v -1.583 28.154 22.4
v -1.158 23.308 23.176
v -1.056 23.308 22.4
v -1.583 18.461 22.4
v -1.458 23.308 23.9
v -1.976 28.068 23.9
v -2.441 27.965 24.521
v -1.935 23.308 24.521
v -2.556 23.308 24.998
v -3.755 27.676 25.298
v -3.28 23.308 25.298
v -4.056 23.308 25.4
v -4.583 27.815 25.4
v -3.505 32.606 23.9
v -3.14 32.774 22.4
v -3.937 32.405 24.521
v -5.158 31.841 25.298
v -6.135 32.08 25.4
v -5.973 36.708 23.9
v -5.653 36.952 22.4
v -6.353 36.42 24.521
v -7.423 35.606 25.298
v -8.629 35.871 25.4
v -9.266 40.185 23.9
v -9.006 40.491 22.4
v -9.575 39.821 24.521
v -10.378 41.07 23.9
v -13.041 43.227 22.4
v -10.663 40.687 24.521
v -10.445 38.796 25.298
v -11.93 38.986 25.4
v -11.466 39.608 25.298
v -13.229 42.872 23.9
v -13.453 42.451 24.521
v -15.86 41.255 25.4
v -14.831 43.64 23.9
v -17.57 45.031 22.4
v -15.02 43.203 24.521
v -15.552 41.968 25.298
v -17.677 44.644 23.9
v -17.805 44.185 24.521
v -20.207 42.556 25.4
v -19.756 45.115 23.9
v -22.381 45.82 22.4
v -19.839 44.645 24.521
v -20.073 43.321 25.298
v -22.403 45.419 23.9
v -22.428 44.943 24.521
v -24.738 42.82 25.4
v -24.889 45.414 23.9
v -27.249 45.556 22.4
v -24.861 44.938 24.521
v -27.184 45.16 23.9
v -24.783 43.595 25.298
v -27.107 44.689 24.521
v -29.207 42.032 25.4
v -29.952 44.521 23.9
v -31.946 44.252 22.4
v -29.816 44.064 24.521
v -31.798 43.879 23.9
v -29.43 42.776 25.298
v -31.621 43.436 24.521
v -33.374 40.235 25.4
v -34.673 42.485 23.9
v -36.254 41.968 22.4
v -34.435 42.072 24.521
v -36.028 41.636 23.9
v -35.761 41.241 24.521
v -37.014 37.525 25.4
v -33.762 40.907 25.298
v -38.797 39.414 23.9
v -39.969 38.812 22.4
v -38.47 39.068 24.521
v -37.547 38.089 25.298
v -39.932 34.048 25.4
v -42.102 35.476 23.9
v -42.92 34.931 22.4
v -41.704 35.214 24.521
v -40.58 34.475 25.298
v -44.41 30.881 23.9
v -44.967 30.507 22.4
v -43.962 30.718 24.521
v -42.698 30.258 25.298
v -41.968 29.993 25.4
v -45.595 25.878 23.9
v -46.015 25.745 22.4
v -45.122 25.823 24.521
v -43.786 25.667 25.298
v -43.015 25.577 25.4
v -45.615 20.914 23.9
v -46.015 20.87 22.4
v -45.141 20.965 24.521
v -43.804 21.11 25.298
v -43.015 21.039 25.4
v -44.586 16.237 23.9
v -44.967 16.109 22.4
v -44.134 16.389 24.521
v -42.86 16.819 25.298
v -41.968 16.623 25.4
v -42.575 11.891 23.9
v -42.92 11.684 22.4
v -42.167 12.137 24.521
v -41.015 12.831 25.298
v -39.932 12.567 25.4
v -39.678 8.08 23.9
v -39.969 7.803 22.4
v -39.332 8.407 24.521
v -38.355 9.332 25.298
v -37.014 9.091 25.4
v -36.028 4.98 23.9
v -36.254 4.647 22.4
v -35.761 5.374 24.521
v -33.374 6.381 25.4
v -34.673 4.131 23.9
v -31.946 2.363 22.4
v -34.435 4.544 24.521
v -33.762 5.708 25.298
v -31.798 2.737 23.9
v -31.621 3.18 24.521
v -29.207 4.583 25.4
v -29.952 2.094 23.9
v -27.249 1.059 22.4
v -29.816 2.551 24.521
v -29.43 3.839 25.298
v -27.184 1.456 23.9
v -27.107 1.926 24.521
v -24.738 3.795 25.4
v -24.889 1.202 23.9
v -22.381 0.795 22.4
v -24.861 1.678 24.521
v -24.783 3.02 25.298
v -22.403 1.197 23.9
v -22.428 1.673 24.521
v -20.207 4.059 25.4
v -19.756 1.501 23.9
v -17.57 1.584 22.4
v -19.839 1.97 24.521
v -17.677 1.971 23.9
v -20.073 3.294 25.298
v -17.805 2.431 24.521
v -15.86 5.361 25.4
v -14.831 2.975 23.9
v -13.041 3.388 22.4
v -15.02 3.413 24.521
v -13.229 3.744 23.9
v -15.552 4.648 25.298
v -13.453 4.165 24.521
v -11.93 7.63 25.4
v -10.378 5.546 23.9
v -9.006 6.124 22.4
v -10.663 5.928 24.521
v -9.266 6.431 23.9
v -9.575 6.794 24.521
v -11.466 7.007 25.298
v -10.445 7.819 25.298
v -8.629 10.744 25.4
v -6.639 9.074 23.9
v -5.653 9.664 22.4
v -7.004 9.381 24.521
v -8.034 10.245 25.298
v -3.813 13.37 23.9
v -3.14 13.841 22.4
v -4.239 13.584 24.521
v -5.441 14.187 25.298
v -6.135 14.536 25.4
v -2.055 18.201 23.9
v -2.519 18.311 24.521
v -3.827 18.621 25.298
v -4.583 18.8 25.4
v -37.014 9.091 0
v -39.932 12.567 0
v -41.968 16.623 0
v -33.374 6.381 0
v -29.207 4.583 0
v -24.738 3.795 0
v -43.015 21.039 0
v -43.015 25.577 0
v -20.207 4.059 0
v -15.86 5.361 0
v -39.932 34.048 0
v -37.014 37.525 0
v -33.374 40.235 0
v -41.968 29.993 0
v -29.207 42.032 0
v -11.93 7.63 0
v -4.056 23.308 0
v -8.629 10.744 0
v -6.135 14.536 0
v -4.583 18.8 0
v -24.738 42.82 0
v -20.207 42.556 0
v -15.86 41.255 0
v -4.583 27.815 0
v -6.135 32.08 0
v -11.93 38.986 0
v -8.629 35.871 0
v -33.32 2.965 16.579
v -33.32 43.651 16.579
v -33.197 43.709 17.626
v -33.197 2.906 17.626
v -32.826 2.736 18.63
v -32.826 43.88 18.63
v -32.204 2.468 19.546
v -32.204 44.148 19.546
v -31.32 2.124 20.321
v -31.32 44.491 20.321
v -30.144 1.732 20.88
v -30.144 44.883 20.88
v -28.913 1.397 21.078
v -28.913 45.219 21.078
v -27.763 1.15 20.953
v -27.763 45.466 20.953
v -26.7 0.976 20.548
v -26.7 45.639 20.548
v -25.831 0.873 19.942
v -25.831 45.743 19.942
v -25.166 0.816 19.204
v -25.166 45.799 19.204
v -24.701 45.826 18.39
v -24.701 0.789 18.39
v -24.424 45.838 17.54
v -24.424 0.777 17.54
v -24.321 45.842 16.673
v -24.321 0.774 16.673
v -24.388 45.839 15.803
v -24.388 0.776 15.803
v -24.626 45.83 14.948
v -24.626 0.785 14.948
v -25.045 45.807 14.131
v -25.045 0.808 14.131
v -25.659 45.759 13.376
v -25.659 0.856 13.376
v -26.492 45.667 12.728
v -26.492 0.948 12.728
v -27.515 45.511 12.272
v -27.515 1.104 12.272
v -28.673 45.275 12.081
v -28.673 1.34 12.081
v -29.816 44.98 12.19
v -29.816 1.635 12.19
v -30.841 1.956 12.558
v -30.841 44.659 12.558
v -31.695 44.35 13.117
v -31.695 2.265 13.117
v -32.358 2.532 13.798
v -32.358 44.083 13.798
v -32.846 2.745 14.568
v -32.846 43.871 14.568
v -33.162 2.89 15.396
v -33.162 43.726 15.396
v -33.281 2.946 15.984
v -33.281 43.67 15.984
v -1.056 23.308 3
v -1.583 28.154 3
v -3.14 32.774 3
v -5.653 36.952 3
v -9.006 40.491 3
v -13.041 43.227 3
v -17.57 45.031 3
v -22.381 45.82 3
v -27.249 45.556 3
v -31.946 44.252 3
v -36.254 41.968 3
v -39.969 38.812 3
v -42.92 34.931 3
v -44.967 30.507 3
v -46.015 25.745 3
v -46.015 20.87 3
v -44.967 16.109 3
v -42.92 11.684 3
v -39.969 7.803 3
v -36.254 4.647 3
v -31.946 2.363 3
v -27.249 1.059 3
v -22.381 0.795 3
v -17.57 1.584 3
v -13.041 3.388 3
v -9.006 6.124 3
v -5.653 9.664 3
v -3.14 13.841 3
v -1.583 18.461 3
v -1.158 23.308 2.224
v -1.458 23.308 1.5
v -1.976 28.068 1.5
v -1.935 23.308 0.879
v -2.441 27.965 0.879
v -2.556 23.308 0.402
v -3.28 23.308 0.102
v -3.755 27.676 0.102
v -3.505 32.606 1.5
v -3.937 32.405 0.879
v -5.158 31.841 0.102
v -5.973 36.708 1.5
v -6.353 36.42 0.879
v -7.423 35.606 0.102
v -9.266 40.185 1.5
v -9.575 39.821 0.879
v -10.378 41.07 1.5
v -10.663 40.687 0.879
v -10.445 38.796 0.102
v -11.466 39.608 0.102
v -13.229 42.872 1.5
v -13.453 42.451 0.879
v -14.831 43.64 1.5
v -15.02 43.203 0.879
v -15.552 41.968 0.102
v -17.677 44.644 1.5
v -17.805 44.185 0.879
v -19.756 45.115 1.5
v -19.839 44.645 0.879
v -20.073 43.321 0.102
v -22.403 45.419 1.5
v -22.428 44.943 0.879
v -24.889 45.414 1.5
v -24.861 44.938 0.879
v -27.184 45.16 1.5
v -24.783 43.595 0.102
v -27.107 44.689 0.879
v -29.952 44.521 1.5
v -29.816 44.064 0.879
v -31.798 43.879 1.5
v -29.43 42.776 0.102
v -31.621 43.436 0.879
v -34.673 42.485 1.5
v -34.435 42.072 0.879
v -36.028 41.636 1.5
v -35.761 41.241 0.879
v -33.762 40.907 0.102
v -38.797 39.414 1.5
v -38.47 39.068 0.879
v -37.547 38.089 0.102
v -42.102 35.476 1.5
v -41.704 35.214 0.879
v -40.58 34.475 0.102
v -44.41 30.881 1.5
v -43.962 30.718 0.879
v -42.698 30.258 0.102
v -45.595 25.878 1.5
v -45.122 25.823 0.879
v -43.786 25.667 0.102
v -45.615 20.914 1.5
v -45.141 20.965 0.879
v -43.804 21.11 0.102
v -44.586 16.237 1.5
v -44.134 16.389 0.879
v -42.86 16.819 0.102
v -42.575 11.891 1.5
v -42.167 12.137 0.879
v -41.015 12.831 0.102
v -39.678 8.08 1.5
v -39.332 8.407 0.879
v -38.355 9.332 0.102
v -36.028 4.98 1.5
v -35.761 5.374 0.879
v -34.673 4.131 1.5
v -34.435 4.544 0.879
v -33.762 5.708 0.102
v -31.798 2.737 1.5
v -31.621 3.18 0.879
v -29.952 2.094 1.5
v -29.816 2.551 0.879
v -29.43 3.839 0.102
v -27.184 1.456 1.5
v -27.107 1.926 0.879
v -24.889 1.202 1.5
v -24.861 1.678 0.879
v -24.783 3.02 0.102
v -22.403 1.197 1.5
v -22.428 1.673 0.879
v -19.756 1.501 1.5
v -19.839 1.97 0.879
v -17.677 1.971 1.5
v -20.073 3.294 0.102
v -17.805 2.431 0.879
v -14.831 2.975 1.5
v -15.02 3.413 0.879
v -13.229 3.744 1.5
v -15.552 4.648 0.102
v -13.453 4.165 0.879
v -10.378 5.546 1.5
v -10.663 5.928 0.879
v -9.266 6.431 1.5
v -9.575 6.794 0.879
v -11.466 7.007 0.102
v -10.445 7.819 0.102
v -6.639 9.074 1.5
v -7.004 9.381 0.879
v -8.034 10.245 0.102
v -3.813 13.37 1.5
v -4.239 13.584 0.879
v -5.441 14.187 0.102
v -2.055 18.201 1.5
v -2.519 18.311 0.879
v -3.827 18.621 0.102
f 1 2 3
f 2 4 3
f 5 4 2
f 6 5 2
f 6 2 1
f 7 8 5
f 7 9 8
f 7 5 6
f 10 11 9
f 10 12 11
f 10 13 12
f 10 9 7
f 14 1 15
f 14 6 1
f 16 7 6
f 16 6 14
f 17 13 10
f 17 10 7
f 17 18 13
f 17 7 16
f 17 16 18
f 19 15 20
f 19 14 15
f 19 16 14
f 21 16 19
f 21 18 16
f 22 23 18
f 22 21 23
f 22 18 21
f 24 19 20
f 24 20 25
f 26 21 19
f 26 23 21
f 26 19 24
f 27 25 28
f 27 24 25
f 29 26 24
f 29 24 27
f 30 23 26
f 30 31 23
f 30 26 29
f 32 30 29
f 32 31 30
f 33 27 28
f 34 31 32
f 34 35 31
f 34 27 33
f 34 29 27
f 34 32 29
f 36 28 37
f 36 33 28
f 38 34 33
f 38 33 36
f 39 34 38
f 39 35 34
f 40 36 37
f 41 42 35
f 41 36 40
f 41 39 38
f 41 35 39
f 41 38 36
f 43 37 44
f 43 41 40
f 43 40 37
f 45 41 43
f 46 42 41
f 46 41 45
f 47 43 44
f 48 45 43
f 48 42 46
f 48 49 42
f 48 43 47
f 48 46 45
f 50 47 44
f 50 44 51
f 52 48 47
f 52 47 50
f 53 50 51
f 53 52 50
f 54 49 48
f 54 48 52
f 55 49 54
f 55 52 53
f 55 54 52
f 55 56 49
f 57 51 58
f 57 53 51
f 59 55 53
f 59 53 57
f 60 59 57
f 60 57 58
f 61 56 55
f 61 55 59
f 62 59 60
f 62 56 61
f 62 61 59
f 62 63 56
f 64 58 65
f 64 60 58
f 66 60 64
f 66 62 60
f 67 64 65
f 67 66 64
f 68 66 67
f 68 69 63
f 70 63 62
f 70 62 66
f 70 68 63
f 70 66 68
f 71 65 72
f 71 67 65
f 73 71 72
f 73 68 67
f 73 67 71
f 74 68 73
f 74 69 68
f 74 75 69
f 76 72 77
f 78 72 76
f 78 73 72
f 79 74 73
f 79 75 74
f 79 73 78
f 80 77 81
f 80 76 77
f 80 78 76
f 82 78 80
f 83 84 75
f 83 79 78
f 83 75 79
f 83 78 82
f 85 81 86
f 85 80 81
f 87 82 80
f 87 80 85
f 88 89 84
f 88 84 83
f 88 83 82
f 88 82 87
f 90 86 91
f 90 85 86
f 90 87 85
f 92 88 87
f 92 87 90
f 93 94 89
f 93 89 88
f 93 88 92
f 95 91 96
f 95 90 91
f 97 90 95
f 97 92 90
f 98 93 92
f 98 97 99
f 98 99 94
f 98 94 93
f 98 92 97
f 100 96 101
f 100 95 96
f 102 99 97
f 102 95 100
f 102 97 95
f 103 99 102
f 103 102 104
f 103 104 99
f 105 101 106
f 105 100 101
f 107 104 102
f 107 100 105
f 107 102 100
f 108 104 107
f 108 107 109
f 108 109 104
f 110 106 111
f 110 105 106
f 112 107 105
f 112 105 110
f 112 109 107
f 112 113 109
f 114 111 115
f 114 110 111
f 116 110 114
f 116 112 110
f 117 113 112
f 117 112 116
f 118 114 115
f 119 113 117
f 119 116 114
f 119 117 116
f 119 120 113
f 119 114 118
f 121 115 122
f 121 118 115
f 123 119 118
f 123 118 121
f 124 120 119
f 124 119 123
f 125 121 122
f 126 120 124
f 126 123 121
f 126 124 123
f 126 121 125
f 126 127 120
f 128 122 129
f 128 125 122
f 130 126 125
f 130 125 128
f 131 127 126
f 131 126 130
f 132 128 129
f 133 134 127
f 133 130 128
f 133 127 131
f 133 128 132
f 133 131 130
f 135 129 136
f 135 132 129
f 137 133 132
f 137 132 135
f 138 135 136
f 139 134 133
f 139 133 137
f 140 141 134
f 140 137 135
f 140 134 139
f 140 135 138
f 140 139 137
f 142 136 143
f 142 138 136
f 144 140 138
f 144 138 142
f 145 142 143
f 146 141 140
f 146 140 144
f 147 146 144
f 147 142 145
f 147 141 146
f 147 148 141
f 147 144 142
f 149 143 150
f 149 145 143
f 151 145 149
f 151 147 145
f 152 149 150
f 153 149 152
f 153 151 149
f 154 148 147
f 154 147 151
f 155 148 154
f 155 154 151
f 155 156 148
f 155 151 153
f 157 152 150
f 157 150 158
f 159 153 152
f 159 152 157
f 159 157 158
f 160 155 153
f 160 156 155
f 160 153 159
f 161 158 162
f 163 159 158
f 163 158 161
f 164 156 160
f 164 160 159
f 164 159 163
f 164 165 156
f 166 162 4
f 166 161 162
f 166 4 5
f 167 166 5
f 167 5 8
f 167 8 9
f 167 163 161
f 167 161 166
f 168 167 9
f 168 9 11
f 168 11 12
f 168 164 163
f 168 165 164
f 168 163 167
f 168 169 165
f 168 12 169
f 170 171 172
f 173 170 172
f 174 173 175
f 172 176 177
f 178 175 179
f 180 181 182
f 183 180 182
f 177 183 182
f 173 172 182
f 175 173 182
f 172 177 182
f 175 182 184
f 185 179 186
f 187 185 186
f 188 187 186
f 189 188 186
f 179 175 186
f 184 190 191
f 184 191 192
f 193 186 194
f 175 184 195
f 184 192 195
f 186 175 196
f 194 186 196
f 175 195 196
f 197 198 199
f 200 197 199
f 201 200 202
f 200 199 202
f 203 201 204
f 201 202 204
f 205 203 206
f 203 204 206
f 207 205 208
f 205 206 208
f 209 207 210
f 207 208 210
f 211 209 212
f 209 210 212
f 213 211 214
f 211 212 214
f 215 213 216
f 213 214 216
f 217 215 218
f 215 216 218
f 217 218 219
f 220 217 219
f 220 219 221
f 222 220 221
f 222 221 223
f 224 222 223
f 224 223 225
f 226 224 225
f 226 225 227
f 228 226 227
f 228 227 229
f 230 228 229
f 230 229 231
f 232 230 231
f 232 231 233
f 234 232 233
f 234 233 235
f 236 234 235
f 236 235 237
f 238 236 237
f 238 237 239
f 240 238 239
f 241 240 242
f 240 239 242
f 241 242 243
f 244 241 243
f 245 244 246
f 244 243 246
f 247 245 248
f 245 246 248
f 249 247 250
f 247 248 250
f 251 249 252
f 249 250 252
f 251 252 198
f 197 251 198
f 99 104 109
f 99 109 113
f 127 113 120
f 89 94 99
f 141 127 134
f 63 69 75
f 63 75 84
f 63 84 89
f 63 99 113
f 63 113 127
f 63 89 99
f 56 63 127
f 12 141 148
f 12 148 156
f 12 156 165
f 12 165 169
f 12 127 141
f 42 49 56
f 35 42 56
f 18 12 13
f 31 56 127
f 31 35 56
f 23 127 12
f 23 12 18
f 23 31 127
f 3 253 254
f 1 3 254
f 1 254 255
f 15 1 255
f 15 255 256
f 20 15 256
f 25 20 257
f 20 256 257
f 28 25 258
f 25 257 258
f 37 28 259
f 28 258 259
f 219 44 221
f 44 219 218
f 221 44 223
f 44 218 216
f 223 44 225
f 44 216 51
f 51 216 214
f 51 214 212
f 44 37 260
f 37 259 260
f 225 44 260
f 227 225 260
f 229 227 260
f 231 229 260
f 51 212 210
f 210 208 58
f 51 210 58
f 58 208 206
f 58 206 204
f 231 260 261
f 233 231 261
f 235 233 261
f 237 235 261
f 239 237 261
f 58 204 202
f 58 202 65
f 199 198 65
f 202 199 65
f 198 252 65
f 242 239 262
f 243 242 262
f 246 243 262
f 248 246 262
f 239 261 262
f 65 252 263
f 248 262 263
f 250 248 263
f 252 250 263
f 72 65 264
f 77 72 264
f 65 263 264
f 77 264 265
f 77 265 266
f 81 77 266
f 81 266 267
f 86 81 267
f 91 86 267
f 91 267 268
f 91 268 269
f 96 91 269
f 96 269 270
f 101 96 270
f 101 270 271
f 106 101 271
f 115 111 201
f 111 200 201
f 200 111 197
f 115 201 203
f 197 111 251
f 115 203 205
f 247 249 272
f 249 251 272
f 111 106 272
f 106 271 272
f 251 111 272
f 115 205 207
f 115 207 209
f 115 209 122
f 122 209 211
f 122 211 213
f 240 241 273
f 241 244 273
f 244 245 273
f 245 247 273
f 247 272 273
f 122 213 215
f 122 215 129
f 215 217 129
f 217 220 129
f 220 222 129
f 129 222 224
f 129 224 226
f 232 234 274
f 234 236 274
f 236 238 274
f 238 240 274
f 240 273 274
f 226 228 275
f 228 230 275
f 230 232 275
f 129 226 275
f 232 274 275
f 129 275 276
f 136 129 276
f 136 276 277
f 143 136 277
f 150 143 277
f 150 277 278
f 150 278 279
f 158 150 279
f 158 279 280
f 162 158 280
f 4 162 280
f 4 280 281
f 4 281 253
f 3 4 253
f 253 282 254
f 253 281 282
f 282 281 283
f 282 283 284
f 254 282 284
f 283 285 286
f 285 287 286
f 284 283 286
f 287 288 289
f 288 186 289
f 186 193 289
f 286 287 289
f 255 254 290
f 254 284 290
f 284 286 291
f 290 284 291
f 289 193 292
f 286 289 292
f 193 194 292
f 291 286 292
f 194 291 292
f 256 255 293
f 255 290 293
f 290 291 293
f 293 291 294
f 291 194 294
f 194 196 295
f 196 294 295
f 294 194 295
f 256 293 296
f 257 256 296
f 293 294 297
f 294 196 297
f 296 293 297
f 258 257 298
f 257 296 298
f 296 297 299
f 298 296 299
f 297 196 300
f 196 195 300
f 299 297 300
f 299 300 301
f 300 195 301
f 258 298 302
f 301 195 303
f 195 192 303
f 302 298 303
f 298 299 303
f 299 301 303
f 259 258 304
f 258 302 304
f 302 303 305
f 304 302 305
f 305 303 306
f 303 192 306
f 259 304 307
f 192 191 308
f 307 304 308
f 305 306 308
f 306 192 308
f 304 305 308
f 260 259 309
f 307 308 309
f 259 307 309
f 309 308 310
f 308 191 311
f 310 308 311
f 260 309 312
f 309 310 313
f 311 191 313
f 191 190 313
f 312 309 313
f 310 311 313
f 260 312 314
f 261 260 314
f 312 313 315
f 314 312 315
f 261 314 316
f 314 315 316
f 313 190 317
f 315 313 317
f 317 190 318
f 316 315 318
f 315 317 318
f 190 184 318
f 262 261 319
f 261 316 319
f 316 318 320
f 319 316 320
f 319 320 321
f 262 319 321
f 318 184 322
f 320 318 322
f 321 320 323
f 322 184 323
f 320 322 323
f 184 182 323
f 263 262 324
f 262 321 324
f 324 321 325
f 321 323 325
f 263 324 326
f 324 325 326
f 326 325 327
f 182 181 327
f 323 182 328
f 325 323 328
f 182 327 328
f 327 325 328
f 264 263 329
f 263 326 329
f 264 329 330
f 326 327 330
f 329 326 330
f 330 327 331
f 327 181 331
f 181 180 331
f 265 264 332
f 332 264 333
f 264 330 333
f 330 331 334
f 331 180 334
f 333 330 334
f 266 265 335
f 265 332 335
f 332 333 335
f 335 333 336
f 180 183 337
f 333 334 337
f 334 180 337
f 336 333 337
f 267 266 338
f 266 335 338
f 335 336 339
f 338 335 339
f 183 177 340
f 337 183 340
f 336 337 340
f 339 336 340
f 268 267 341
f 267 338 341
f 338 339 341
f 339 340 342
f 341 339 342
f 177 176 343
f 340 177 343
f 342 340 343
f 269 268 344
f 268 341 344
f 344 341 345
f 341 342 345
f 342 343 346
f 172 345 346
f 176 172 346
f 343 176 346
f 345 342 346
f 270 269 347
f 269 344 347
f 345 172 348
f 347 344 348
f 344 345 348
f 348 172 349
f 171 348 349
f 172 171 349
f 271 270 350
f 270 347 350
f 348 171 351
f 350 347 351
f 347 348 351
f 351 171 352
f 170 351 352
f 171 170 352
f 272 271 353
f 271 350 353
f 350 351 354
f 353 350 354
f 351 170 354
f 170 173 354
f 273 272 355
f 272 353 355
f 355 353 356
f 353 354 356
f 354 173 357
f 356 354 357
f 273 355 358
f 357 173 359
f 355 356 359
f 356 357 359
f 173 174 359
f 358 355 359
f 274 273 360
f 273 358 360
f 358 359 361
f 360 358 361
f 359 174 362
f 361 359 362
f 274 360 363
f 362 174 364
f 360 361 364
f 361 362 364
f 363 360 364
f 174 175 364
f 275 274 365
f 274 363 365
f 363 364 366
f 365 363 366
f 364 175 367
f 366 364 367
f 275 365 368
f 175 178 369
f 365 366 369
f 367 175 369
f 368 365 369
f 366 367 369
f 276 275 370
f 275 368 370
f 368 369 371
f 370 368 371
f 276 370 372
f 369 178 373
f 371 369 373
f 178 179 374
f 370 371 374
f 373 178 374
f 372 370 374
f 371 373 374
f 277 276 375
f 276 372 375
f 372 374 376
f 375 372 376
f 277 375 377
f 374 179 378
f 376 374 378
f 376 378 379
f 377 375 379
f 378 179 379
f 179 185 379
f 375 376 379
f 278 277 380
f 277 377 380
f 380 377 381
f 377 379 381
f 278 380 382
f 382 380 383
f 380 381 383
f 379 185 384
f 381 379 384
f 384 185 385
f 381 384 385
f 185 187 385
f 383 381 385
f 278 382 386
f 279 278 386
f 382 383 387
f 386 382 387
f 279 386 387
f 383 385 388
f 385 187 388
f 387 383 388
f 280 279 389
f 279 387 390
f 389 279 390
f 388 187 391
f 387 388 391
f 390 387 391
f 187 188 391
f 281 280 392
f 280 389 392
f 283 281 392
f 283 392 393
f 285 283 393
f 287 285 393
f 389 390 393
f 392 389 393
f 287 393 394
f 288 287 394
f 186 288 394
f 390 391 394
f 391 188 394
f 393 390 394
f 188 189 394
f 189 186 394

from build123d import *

# Parameters (mm, degrees)
F0_R     = 22.545516
F1_DEPTH = 25.4
F3_D     = 9
F4_R     = 3


with BuildPart() as f1:
    # F0 (on Top) → F1 (new body)
    with BuildSketch(Plane.XY):
        with Locations((-23.601482, 23.307687)):
            Circle(F0_R)
    extrude(amount=F1_DEPTH)

    # F3 (through all)
    with Locations(Plane.XZ):
        with Locations((-28.820381, 16.578948)):
            Hole(F3_D / 2)

    # F4
    f4_edges = [f1.edges().sort_by_distance(p)[0] for p in [
        (-46.146997, 23.307687, 25.4),
        (-46.146997, 23.307687, 0),
    ]]
    fillet(f4_edges, radius=F4_R)


solid = f1.part
